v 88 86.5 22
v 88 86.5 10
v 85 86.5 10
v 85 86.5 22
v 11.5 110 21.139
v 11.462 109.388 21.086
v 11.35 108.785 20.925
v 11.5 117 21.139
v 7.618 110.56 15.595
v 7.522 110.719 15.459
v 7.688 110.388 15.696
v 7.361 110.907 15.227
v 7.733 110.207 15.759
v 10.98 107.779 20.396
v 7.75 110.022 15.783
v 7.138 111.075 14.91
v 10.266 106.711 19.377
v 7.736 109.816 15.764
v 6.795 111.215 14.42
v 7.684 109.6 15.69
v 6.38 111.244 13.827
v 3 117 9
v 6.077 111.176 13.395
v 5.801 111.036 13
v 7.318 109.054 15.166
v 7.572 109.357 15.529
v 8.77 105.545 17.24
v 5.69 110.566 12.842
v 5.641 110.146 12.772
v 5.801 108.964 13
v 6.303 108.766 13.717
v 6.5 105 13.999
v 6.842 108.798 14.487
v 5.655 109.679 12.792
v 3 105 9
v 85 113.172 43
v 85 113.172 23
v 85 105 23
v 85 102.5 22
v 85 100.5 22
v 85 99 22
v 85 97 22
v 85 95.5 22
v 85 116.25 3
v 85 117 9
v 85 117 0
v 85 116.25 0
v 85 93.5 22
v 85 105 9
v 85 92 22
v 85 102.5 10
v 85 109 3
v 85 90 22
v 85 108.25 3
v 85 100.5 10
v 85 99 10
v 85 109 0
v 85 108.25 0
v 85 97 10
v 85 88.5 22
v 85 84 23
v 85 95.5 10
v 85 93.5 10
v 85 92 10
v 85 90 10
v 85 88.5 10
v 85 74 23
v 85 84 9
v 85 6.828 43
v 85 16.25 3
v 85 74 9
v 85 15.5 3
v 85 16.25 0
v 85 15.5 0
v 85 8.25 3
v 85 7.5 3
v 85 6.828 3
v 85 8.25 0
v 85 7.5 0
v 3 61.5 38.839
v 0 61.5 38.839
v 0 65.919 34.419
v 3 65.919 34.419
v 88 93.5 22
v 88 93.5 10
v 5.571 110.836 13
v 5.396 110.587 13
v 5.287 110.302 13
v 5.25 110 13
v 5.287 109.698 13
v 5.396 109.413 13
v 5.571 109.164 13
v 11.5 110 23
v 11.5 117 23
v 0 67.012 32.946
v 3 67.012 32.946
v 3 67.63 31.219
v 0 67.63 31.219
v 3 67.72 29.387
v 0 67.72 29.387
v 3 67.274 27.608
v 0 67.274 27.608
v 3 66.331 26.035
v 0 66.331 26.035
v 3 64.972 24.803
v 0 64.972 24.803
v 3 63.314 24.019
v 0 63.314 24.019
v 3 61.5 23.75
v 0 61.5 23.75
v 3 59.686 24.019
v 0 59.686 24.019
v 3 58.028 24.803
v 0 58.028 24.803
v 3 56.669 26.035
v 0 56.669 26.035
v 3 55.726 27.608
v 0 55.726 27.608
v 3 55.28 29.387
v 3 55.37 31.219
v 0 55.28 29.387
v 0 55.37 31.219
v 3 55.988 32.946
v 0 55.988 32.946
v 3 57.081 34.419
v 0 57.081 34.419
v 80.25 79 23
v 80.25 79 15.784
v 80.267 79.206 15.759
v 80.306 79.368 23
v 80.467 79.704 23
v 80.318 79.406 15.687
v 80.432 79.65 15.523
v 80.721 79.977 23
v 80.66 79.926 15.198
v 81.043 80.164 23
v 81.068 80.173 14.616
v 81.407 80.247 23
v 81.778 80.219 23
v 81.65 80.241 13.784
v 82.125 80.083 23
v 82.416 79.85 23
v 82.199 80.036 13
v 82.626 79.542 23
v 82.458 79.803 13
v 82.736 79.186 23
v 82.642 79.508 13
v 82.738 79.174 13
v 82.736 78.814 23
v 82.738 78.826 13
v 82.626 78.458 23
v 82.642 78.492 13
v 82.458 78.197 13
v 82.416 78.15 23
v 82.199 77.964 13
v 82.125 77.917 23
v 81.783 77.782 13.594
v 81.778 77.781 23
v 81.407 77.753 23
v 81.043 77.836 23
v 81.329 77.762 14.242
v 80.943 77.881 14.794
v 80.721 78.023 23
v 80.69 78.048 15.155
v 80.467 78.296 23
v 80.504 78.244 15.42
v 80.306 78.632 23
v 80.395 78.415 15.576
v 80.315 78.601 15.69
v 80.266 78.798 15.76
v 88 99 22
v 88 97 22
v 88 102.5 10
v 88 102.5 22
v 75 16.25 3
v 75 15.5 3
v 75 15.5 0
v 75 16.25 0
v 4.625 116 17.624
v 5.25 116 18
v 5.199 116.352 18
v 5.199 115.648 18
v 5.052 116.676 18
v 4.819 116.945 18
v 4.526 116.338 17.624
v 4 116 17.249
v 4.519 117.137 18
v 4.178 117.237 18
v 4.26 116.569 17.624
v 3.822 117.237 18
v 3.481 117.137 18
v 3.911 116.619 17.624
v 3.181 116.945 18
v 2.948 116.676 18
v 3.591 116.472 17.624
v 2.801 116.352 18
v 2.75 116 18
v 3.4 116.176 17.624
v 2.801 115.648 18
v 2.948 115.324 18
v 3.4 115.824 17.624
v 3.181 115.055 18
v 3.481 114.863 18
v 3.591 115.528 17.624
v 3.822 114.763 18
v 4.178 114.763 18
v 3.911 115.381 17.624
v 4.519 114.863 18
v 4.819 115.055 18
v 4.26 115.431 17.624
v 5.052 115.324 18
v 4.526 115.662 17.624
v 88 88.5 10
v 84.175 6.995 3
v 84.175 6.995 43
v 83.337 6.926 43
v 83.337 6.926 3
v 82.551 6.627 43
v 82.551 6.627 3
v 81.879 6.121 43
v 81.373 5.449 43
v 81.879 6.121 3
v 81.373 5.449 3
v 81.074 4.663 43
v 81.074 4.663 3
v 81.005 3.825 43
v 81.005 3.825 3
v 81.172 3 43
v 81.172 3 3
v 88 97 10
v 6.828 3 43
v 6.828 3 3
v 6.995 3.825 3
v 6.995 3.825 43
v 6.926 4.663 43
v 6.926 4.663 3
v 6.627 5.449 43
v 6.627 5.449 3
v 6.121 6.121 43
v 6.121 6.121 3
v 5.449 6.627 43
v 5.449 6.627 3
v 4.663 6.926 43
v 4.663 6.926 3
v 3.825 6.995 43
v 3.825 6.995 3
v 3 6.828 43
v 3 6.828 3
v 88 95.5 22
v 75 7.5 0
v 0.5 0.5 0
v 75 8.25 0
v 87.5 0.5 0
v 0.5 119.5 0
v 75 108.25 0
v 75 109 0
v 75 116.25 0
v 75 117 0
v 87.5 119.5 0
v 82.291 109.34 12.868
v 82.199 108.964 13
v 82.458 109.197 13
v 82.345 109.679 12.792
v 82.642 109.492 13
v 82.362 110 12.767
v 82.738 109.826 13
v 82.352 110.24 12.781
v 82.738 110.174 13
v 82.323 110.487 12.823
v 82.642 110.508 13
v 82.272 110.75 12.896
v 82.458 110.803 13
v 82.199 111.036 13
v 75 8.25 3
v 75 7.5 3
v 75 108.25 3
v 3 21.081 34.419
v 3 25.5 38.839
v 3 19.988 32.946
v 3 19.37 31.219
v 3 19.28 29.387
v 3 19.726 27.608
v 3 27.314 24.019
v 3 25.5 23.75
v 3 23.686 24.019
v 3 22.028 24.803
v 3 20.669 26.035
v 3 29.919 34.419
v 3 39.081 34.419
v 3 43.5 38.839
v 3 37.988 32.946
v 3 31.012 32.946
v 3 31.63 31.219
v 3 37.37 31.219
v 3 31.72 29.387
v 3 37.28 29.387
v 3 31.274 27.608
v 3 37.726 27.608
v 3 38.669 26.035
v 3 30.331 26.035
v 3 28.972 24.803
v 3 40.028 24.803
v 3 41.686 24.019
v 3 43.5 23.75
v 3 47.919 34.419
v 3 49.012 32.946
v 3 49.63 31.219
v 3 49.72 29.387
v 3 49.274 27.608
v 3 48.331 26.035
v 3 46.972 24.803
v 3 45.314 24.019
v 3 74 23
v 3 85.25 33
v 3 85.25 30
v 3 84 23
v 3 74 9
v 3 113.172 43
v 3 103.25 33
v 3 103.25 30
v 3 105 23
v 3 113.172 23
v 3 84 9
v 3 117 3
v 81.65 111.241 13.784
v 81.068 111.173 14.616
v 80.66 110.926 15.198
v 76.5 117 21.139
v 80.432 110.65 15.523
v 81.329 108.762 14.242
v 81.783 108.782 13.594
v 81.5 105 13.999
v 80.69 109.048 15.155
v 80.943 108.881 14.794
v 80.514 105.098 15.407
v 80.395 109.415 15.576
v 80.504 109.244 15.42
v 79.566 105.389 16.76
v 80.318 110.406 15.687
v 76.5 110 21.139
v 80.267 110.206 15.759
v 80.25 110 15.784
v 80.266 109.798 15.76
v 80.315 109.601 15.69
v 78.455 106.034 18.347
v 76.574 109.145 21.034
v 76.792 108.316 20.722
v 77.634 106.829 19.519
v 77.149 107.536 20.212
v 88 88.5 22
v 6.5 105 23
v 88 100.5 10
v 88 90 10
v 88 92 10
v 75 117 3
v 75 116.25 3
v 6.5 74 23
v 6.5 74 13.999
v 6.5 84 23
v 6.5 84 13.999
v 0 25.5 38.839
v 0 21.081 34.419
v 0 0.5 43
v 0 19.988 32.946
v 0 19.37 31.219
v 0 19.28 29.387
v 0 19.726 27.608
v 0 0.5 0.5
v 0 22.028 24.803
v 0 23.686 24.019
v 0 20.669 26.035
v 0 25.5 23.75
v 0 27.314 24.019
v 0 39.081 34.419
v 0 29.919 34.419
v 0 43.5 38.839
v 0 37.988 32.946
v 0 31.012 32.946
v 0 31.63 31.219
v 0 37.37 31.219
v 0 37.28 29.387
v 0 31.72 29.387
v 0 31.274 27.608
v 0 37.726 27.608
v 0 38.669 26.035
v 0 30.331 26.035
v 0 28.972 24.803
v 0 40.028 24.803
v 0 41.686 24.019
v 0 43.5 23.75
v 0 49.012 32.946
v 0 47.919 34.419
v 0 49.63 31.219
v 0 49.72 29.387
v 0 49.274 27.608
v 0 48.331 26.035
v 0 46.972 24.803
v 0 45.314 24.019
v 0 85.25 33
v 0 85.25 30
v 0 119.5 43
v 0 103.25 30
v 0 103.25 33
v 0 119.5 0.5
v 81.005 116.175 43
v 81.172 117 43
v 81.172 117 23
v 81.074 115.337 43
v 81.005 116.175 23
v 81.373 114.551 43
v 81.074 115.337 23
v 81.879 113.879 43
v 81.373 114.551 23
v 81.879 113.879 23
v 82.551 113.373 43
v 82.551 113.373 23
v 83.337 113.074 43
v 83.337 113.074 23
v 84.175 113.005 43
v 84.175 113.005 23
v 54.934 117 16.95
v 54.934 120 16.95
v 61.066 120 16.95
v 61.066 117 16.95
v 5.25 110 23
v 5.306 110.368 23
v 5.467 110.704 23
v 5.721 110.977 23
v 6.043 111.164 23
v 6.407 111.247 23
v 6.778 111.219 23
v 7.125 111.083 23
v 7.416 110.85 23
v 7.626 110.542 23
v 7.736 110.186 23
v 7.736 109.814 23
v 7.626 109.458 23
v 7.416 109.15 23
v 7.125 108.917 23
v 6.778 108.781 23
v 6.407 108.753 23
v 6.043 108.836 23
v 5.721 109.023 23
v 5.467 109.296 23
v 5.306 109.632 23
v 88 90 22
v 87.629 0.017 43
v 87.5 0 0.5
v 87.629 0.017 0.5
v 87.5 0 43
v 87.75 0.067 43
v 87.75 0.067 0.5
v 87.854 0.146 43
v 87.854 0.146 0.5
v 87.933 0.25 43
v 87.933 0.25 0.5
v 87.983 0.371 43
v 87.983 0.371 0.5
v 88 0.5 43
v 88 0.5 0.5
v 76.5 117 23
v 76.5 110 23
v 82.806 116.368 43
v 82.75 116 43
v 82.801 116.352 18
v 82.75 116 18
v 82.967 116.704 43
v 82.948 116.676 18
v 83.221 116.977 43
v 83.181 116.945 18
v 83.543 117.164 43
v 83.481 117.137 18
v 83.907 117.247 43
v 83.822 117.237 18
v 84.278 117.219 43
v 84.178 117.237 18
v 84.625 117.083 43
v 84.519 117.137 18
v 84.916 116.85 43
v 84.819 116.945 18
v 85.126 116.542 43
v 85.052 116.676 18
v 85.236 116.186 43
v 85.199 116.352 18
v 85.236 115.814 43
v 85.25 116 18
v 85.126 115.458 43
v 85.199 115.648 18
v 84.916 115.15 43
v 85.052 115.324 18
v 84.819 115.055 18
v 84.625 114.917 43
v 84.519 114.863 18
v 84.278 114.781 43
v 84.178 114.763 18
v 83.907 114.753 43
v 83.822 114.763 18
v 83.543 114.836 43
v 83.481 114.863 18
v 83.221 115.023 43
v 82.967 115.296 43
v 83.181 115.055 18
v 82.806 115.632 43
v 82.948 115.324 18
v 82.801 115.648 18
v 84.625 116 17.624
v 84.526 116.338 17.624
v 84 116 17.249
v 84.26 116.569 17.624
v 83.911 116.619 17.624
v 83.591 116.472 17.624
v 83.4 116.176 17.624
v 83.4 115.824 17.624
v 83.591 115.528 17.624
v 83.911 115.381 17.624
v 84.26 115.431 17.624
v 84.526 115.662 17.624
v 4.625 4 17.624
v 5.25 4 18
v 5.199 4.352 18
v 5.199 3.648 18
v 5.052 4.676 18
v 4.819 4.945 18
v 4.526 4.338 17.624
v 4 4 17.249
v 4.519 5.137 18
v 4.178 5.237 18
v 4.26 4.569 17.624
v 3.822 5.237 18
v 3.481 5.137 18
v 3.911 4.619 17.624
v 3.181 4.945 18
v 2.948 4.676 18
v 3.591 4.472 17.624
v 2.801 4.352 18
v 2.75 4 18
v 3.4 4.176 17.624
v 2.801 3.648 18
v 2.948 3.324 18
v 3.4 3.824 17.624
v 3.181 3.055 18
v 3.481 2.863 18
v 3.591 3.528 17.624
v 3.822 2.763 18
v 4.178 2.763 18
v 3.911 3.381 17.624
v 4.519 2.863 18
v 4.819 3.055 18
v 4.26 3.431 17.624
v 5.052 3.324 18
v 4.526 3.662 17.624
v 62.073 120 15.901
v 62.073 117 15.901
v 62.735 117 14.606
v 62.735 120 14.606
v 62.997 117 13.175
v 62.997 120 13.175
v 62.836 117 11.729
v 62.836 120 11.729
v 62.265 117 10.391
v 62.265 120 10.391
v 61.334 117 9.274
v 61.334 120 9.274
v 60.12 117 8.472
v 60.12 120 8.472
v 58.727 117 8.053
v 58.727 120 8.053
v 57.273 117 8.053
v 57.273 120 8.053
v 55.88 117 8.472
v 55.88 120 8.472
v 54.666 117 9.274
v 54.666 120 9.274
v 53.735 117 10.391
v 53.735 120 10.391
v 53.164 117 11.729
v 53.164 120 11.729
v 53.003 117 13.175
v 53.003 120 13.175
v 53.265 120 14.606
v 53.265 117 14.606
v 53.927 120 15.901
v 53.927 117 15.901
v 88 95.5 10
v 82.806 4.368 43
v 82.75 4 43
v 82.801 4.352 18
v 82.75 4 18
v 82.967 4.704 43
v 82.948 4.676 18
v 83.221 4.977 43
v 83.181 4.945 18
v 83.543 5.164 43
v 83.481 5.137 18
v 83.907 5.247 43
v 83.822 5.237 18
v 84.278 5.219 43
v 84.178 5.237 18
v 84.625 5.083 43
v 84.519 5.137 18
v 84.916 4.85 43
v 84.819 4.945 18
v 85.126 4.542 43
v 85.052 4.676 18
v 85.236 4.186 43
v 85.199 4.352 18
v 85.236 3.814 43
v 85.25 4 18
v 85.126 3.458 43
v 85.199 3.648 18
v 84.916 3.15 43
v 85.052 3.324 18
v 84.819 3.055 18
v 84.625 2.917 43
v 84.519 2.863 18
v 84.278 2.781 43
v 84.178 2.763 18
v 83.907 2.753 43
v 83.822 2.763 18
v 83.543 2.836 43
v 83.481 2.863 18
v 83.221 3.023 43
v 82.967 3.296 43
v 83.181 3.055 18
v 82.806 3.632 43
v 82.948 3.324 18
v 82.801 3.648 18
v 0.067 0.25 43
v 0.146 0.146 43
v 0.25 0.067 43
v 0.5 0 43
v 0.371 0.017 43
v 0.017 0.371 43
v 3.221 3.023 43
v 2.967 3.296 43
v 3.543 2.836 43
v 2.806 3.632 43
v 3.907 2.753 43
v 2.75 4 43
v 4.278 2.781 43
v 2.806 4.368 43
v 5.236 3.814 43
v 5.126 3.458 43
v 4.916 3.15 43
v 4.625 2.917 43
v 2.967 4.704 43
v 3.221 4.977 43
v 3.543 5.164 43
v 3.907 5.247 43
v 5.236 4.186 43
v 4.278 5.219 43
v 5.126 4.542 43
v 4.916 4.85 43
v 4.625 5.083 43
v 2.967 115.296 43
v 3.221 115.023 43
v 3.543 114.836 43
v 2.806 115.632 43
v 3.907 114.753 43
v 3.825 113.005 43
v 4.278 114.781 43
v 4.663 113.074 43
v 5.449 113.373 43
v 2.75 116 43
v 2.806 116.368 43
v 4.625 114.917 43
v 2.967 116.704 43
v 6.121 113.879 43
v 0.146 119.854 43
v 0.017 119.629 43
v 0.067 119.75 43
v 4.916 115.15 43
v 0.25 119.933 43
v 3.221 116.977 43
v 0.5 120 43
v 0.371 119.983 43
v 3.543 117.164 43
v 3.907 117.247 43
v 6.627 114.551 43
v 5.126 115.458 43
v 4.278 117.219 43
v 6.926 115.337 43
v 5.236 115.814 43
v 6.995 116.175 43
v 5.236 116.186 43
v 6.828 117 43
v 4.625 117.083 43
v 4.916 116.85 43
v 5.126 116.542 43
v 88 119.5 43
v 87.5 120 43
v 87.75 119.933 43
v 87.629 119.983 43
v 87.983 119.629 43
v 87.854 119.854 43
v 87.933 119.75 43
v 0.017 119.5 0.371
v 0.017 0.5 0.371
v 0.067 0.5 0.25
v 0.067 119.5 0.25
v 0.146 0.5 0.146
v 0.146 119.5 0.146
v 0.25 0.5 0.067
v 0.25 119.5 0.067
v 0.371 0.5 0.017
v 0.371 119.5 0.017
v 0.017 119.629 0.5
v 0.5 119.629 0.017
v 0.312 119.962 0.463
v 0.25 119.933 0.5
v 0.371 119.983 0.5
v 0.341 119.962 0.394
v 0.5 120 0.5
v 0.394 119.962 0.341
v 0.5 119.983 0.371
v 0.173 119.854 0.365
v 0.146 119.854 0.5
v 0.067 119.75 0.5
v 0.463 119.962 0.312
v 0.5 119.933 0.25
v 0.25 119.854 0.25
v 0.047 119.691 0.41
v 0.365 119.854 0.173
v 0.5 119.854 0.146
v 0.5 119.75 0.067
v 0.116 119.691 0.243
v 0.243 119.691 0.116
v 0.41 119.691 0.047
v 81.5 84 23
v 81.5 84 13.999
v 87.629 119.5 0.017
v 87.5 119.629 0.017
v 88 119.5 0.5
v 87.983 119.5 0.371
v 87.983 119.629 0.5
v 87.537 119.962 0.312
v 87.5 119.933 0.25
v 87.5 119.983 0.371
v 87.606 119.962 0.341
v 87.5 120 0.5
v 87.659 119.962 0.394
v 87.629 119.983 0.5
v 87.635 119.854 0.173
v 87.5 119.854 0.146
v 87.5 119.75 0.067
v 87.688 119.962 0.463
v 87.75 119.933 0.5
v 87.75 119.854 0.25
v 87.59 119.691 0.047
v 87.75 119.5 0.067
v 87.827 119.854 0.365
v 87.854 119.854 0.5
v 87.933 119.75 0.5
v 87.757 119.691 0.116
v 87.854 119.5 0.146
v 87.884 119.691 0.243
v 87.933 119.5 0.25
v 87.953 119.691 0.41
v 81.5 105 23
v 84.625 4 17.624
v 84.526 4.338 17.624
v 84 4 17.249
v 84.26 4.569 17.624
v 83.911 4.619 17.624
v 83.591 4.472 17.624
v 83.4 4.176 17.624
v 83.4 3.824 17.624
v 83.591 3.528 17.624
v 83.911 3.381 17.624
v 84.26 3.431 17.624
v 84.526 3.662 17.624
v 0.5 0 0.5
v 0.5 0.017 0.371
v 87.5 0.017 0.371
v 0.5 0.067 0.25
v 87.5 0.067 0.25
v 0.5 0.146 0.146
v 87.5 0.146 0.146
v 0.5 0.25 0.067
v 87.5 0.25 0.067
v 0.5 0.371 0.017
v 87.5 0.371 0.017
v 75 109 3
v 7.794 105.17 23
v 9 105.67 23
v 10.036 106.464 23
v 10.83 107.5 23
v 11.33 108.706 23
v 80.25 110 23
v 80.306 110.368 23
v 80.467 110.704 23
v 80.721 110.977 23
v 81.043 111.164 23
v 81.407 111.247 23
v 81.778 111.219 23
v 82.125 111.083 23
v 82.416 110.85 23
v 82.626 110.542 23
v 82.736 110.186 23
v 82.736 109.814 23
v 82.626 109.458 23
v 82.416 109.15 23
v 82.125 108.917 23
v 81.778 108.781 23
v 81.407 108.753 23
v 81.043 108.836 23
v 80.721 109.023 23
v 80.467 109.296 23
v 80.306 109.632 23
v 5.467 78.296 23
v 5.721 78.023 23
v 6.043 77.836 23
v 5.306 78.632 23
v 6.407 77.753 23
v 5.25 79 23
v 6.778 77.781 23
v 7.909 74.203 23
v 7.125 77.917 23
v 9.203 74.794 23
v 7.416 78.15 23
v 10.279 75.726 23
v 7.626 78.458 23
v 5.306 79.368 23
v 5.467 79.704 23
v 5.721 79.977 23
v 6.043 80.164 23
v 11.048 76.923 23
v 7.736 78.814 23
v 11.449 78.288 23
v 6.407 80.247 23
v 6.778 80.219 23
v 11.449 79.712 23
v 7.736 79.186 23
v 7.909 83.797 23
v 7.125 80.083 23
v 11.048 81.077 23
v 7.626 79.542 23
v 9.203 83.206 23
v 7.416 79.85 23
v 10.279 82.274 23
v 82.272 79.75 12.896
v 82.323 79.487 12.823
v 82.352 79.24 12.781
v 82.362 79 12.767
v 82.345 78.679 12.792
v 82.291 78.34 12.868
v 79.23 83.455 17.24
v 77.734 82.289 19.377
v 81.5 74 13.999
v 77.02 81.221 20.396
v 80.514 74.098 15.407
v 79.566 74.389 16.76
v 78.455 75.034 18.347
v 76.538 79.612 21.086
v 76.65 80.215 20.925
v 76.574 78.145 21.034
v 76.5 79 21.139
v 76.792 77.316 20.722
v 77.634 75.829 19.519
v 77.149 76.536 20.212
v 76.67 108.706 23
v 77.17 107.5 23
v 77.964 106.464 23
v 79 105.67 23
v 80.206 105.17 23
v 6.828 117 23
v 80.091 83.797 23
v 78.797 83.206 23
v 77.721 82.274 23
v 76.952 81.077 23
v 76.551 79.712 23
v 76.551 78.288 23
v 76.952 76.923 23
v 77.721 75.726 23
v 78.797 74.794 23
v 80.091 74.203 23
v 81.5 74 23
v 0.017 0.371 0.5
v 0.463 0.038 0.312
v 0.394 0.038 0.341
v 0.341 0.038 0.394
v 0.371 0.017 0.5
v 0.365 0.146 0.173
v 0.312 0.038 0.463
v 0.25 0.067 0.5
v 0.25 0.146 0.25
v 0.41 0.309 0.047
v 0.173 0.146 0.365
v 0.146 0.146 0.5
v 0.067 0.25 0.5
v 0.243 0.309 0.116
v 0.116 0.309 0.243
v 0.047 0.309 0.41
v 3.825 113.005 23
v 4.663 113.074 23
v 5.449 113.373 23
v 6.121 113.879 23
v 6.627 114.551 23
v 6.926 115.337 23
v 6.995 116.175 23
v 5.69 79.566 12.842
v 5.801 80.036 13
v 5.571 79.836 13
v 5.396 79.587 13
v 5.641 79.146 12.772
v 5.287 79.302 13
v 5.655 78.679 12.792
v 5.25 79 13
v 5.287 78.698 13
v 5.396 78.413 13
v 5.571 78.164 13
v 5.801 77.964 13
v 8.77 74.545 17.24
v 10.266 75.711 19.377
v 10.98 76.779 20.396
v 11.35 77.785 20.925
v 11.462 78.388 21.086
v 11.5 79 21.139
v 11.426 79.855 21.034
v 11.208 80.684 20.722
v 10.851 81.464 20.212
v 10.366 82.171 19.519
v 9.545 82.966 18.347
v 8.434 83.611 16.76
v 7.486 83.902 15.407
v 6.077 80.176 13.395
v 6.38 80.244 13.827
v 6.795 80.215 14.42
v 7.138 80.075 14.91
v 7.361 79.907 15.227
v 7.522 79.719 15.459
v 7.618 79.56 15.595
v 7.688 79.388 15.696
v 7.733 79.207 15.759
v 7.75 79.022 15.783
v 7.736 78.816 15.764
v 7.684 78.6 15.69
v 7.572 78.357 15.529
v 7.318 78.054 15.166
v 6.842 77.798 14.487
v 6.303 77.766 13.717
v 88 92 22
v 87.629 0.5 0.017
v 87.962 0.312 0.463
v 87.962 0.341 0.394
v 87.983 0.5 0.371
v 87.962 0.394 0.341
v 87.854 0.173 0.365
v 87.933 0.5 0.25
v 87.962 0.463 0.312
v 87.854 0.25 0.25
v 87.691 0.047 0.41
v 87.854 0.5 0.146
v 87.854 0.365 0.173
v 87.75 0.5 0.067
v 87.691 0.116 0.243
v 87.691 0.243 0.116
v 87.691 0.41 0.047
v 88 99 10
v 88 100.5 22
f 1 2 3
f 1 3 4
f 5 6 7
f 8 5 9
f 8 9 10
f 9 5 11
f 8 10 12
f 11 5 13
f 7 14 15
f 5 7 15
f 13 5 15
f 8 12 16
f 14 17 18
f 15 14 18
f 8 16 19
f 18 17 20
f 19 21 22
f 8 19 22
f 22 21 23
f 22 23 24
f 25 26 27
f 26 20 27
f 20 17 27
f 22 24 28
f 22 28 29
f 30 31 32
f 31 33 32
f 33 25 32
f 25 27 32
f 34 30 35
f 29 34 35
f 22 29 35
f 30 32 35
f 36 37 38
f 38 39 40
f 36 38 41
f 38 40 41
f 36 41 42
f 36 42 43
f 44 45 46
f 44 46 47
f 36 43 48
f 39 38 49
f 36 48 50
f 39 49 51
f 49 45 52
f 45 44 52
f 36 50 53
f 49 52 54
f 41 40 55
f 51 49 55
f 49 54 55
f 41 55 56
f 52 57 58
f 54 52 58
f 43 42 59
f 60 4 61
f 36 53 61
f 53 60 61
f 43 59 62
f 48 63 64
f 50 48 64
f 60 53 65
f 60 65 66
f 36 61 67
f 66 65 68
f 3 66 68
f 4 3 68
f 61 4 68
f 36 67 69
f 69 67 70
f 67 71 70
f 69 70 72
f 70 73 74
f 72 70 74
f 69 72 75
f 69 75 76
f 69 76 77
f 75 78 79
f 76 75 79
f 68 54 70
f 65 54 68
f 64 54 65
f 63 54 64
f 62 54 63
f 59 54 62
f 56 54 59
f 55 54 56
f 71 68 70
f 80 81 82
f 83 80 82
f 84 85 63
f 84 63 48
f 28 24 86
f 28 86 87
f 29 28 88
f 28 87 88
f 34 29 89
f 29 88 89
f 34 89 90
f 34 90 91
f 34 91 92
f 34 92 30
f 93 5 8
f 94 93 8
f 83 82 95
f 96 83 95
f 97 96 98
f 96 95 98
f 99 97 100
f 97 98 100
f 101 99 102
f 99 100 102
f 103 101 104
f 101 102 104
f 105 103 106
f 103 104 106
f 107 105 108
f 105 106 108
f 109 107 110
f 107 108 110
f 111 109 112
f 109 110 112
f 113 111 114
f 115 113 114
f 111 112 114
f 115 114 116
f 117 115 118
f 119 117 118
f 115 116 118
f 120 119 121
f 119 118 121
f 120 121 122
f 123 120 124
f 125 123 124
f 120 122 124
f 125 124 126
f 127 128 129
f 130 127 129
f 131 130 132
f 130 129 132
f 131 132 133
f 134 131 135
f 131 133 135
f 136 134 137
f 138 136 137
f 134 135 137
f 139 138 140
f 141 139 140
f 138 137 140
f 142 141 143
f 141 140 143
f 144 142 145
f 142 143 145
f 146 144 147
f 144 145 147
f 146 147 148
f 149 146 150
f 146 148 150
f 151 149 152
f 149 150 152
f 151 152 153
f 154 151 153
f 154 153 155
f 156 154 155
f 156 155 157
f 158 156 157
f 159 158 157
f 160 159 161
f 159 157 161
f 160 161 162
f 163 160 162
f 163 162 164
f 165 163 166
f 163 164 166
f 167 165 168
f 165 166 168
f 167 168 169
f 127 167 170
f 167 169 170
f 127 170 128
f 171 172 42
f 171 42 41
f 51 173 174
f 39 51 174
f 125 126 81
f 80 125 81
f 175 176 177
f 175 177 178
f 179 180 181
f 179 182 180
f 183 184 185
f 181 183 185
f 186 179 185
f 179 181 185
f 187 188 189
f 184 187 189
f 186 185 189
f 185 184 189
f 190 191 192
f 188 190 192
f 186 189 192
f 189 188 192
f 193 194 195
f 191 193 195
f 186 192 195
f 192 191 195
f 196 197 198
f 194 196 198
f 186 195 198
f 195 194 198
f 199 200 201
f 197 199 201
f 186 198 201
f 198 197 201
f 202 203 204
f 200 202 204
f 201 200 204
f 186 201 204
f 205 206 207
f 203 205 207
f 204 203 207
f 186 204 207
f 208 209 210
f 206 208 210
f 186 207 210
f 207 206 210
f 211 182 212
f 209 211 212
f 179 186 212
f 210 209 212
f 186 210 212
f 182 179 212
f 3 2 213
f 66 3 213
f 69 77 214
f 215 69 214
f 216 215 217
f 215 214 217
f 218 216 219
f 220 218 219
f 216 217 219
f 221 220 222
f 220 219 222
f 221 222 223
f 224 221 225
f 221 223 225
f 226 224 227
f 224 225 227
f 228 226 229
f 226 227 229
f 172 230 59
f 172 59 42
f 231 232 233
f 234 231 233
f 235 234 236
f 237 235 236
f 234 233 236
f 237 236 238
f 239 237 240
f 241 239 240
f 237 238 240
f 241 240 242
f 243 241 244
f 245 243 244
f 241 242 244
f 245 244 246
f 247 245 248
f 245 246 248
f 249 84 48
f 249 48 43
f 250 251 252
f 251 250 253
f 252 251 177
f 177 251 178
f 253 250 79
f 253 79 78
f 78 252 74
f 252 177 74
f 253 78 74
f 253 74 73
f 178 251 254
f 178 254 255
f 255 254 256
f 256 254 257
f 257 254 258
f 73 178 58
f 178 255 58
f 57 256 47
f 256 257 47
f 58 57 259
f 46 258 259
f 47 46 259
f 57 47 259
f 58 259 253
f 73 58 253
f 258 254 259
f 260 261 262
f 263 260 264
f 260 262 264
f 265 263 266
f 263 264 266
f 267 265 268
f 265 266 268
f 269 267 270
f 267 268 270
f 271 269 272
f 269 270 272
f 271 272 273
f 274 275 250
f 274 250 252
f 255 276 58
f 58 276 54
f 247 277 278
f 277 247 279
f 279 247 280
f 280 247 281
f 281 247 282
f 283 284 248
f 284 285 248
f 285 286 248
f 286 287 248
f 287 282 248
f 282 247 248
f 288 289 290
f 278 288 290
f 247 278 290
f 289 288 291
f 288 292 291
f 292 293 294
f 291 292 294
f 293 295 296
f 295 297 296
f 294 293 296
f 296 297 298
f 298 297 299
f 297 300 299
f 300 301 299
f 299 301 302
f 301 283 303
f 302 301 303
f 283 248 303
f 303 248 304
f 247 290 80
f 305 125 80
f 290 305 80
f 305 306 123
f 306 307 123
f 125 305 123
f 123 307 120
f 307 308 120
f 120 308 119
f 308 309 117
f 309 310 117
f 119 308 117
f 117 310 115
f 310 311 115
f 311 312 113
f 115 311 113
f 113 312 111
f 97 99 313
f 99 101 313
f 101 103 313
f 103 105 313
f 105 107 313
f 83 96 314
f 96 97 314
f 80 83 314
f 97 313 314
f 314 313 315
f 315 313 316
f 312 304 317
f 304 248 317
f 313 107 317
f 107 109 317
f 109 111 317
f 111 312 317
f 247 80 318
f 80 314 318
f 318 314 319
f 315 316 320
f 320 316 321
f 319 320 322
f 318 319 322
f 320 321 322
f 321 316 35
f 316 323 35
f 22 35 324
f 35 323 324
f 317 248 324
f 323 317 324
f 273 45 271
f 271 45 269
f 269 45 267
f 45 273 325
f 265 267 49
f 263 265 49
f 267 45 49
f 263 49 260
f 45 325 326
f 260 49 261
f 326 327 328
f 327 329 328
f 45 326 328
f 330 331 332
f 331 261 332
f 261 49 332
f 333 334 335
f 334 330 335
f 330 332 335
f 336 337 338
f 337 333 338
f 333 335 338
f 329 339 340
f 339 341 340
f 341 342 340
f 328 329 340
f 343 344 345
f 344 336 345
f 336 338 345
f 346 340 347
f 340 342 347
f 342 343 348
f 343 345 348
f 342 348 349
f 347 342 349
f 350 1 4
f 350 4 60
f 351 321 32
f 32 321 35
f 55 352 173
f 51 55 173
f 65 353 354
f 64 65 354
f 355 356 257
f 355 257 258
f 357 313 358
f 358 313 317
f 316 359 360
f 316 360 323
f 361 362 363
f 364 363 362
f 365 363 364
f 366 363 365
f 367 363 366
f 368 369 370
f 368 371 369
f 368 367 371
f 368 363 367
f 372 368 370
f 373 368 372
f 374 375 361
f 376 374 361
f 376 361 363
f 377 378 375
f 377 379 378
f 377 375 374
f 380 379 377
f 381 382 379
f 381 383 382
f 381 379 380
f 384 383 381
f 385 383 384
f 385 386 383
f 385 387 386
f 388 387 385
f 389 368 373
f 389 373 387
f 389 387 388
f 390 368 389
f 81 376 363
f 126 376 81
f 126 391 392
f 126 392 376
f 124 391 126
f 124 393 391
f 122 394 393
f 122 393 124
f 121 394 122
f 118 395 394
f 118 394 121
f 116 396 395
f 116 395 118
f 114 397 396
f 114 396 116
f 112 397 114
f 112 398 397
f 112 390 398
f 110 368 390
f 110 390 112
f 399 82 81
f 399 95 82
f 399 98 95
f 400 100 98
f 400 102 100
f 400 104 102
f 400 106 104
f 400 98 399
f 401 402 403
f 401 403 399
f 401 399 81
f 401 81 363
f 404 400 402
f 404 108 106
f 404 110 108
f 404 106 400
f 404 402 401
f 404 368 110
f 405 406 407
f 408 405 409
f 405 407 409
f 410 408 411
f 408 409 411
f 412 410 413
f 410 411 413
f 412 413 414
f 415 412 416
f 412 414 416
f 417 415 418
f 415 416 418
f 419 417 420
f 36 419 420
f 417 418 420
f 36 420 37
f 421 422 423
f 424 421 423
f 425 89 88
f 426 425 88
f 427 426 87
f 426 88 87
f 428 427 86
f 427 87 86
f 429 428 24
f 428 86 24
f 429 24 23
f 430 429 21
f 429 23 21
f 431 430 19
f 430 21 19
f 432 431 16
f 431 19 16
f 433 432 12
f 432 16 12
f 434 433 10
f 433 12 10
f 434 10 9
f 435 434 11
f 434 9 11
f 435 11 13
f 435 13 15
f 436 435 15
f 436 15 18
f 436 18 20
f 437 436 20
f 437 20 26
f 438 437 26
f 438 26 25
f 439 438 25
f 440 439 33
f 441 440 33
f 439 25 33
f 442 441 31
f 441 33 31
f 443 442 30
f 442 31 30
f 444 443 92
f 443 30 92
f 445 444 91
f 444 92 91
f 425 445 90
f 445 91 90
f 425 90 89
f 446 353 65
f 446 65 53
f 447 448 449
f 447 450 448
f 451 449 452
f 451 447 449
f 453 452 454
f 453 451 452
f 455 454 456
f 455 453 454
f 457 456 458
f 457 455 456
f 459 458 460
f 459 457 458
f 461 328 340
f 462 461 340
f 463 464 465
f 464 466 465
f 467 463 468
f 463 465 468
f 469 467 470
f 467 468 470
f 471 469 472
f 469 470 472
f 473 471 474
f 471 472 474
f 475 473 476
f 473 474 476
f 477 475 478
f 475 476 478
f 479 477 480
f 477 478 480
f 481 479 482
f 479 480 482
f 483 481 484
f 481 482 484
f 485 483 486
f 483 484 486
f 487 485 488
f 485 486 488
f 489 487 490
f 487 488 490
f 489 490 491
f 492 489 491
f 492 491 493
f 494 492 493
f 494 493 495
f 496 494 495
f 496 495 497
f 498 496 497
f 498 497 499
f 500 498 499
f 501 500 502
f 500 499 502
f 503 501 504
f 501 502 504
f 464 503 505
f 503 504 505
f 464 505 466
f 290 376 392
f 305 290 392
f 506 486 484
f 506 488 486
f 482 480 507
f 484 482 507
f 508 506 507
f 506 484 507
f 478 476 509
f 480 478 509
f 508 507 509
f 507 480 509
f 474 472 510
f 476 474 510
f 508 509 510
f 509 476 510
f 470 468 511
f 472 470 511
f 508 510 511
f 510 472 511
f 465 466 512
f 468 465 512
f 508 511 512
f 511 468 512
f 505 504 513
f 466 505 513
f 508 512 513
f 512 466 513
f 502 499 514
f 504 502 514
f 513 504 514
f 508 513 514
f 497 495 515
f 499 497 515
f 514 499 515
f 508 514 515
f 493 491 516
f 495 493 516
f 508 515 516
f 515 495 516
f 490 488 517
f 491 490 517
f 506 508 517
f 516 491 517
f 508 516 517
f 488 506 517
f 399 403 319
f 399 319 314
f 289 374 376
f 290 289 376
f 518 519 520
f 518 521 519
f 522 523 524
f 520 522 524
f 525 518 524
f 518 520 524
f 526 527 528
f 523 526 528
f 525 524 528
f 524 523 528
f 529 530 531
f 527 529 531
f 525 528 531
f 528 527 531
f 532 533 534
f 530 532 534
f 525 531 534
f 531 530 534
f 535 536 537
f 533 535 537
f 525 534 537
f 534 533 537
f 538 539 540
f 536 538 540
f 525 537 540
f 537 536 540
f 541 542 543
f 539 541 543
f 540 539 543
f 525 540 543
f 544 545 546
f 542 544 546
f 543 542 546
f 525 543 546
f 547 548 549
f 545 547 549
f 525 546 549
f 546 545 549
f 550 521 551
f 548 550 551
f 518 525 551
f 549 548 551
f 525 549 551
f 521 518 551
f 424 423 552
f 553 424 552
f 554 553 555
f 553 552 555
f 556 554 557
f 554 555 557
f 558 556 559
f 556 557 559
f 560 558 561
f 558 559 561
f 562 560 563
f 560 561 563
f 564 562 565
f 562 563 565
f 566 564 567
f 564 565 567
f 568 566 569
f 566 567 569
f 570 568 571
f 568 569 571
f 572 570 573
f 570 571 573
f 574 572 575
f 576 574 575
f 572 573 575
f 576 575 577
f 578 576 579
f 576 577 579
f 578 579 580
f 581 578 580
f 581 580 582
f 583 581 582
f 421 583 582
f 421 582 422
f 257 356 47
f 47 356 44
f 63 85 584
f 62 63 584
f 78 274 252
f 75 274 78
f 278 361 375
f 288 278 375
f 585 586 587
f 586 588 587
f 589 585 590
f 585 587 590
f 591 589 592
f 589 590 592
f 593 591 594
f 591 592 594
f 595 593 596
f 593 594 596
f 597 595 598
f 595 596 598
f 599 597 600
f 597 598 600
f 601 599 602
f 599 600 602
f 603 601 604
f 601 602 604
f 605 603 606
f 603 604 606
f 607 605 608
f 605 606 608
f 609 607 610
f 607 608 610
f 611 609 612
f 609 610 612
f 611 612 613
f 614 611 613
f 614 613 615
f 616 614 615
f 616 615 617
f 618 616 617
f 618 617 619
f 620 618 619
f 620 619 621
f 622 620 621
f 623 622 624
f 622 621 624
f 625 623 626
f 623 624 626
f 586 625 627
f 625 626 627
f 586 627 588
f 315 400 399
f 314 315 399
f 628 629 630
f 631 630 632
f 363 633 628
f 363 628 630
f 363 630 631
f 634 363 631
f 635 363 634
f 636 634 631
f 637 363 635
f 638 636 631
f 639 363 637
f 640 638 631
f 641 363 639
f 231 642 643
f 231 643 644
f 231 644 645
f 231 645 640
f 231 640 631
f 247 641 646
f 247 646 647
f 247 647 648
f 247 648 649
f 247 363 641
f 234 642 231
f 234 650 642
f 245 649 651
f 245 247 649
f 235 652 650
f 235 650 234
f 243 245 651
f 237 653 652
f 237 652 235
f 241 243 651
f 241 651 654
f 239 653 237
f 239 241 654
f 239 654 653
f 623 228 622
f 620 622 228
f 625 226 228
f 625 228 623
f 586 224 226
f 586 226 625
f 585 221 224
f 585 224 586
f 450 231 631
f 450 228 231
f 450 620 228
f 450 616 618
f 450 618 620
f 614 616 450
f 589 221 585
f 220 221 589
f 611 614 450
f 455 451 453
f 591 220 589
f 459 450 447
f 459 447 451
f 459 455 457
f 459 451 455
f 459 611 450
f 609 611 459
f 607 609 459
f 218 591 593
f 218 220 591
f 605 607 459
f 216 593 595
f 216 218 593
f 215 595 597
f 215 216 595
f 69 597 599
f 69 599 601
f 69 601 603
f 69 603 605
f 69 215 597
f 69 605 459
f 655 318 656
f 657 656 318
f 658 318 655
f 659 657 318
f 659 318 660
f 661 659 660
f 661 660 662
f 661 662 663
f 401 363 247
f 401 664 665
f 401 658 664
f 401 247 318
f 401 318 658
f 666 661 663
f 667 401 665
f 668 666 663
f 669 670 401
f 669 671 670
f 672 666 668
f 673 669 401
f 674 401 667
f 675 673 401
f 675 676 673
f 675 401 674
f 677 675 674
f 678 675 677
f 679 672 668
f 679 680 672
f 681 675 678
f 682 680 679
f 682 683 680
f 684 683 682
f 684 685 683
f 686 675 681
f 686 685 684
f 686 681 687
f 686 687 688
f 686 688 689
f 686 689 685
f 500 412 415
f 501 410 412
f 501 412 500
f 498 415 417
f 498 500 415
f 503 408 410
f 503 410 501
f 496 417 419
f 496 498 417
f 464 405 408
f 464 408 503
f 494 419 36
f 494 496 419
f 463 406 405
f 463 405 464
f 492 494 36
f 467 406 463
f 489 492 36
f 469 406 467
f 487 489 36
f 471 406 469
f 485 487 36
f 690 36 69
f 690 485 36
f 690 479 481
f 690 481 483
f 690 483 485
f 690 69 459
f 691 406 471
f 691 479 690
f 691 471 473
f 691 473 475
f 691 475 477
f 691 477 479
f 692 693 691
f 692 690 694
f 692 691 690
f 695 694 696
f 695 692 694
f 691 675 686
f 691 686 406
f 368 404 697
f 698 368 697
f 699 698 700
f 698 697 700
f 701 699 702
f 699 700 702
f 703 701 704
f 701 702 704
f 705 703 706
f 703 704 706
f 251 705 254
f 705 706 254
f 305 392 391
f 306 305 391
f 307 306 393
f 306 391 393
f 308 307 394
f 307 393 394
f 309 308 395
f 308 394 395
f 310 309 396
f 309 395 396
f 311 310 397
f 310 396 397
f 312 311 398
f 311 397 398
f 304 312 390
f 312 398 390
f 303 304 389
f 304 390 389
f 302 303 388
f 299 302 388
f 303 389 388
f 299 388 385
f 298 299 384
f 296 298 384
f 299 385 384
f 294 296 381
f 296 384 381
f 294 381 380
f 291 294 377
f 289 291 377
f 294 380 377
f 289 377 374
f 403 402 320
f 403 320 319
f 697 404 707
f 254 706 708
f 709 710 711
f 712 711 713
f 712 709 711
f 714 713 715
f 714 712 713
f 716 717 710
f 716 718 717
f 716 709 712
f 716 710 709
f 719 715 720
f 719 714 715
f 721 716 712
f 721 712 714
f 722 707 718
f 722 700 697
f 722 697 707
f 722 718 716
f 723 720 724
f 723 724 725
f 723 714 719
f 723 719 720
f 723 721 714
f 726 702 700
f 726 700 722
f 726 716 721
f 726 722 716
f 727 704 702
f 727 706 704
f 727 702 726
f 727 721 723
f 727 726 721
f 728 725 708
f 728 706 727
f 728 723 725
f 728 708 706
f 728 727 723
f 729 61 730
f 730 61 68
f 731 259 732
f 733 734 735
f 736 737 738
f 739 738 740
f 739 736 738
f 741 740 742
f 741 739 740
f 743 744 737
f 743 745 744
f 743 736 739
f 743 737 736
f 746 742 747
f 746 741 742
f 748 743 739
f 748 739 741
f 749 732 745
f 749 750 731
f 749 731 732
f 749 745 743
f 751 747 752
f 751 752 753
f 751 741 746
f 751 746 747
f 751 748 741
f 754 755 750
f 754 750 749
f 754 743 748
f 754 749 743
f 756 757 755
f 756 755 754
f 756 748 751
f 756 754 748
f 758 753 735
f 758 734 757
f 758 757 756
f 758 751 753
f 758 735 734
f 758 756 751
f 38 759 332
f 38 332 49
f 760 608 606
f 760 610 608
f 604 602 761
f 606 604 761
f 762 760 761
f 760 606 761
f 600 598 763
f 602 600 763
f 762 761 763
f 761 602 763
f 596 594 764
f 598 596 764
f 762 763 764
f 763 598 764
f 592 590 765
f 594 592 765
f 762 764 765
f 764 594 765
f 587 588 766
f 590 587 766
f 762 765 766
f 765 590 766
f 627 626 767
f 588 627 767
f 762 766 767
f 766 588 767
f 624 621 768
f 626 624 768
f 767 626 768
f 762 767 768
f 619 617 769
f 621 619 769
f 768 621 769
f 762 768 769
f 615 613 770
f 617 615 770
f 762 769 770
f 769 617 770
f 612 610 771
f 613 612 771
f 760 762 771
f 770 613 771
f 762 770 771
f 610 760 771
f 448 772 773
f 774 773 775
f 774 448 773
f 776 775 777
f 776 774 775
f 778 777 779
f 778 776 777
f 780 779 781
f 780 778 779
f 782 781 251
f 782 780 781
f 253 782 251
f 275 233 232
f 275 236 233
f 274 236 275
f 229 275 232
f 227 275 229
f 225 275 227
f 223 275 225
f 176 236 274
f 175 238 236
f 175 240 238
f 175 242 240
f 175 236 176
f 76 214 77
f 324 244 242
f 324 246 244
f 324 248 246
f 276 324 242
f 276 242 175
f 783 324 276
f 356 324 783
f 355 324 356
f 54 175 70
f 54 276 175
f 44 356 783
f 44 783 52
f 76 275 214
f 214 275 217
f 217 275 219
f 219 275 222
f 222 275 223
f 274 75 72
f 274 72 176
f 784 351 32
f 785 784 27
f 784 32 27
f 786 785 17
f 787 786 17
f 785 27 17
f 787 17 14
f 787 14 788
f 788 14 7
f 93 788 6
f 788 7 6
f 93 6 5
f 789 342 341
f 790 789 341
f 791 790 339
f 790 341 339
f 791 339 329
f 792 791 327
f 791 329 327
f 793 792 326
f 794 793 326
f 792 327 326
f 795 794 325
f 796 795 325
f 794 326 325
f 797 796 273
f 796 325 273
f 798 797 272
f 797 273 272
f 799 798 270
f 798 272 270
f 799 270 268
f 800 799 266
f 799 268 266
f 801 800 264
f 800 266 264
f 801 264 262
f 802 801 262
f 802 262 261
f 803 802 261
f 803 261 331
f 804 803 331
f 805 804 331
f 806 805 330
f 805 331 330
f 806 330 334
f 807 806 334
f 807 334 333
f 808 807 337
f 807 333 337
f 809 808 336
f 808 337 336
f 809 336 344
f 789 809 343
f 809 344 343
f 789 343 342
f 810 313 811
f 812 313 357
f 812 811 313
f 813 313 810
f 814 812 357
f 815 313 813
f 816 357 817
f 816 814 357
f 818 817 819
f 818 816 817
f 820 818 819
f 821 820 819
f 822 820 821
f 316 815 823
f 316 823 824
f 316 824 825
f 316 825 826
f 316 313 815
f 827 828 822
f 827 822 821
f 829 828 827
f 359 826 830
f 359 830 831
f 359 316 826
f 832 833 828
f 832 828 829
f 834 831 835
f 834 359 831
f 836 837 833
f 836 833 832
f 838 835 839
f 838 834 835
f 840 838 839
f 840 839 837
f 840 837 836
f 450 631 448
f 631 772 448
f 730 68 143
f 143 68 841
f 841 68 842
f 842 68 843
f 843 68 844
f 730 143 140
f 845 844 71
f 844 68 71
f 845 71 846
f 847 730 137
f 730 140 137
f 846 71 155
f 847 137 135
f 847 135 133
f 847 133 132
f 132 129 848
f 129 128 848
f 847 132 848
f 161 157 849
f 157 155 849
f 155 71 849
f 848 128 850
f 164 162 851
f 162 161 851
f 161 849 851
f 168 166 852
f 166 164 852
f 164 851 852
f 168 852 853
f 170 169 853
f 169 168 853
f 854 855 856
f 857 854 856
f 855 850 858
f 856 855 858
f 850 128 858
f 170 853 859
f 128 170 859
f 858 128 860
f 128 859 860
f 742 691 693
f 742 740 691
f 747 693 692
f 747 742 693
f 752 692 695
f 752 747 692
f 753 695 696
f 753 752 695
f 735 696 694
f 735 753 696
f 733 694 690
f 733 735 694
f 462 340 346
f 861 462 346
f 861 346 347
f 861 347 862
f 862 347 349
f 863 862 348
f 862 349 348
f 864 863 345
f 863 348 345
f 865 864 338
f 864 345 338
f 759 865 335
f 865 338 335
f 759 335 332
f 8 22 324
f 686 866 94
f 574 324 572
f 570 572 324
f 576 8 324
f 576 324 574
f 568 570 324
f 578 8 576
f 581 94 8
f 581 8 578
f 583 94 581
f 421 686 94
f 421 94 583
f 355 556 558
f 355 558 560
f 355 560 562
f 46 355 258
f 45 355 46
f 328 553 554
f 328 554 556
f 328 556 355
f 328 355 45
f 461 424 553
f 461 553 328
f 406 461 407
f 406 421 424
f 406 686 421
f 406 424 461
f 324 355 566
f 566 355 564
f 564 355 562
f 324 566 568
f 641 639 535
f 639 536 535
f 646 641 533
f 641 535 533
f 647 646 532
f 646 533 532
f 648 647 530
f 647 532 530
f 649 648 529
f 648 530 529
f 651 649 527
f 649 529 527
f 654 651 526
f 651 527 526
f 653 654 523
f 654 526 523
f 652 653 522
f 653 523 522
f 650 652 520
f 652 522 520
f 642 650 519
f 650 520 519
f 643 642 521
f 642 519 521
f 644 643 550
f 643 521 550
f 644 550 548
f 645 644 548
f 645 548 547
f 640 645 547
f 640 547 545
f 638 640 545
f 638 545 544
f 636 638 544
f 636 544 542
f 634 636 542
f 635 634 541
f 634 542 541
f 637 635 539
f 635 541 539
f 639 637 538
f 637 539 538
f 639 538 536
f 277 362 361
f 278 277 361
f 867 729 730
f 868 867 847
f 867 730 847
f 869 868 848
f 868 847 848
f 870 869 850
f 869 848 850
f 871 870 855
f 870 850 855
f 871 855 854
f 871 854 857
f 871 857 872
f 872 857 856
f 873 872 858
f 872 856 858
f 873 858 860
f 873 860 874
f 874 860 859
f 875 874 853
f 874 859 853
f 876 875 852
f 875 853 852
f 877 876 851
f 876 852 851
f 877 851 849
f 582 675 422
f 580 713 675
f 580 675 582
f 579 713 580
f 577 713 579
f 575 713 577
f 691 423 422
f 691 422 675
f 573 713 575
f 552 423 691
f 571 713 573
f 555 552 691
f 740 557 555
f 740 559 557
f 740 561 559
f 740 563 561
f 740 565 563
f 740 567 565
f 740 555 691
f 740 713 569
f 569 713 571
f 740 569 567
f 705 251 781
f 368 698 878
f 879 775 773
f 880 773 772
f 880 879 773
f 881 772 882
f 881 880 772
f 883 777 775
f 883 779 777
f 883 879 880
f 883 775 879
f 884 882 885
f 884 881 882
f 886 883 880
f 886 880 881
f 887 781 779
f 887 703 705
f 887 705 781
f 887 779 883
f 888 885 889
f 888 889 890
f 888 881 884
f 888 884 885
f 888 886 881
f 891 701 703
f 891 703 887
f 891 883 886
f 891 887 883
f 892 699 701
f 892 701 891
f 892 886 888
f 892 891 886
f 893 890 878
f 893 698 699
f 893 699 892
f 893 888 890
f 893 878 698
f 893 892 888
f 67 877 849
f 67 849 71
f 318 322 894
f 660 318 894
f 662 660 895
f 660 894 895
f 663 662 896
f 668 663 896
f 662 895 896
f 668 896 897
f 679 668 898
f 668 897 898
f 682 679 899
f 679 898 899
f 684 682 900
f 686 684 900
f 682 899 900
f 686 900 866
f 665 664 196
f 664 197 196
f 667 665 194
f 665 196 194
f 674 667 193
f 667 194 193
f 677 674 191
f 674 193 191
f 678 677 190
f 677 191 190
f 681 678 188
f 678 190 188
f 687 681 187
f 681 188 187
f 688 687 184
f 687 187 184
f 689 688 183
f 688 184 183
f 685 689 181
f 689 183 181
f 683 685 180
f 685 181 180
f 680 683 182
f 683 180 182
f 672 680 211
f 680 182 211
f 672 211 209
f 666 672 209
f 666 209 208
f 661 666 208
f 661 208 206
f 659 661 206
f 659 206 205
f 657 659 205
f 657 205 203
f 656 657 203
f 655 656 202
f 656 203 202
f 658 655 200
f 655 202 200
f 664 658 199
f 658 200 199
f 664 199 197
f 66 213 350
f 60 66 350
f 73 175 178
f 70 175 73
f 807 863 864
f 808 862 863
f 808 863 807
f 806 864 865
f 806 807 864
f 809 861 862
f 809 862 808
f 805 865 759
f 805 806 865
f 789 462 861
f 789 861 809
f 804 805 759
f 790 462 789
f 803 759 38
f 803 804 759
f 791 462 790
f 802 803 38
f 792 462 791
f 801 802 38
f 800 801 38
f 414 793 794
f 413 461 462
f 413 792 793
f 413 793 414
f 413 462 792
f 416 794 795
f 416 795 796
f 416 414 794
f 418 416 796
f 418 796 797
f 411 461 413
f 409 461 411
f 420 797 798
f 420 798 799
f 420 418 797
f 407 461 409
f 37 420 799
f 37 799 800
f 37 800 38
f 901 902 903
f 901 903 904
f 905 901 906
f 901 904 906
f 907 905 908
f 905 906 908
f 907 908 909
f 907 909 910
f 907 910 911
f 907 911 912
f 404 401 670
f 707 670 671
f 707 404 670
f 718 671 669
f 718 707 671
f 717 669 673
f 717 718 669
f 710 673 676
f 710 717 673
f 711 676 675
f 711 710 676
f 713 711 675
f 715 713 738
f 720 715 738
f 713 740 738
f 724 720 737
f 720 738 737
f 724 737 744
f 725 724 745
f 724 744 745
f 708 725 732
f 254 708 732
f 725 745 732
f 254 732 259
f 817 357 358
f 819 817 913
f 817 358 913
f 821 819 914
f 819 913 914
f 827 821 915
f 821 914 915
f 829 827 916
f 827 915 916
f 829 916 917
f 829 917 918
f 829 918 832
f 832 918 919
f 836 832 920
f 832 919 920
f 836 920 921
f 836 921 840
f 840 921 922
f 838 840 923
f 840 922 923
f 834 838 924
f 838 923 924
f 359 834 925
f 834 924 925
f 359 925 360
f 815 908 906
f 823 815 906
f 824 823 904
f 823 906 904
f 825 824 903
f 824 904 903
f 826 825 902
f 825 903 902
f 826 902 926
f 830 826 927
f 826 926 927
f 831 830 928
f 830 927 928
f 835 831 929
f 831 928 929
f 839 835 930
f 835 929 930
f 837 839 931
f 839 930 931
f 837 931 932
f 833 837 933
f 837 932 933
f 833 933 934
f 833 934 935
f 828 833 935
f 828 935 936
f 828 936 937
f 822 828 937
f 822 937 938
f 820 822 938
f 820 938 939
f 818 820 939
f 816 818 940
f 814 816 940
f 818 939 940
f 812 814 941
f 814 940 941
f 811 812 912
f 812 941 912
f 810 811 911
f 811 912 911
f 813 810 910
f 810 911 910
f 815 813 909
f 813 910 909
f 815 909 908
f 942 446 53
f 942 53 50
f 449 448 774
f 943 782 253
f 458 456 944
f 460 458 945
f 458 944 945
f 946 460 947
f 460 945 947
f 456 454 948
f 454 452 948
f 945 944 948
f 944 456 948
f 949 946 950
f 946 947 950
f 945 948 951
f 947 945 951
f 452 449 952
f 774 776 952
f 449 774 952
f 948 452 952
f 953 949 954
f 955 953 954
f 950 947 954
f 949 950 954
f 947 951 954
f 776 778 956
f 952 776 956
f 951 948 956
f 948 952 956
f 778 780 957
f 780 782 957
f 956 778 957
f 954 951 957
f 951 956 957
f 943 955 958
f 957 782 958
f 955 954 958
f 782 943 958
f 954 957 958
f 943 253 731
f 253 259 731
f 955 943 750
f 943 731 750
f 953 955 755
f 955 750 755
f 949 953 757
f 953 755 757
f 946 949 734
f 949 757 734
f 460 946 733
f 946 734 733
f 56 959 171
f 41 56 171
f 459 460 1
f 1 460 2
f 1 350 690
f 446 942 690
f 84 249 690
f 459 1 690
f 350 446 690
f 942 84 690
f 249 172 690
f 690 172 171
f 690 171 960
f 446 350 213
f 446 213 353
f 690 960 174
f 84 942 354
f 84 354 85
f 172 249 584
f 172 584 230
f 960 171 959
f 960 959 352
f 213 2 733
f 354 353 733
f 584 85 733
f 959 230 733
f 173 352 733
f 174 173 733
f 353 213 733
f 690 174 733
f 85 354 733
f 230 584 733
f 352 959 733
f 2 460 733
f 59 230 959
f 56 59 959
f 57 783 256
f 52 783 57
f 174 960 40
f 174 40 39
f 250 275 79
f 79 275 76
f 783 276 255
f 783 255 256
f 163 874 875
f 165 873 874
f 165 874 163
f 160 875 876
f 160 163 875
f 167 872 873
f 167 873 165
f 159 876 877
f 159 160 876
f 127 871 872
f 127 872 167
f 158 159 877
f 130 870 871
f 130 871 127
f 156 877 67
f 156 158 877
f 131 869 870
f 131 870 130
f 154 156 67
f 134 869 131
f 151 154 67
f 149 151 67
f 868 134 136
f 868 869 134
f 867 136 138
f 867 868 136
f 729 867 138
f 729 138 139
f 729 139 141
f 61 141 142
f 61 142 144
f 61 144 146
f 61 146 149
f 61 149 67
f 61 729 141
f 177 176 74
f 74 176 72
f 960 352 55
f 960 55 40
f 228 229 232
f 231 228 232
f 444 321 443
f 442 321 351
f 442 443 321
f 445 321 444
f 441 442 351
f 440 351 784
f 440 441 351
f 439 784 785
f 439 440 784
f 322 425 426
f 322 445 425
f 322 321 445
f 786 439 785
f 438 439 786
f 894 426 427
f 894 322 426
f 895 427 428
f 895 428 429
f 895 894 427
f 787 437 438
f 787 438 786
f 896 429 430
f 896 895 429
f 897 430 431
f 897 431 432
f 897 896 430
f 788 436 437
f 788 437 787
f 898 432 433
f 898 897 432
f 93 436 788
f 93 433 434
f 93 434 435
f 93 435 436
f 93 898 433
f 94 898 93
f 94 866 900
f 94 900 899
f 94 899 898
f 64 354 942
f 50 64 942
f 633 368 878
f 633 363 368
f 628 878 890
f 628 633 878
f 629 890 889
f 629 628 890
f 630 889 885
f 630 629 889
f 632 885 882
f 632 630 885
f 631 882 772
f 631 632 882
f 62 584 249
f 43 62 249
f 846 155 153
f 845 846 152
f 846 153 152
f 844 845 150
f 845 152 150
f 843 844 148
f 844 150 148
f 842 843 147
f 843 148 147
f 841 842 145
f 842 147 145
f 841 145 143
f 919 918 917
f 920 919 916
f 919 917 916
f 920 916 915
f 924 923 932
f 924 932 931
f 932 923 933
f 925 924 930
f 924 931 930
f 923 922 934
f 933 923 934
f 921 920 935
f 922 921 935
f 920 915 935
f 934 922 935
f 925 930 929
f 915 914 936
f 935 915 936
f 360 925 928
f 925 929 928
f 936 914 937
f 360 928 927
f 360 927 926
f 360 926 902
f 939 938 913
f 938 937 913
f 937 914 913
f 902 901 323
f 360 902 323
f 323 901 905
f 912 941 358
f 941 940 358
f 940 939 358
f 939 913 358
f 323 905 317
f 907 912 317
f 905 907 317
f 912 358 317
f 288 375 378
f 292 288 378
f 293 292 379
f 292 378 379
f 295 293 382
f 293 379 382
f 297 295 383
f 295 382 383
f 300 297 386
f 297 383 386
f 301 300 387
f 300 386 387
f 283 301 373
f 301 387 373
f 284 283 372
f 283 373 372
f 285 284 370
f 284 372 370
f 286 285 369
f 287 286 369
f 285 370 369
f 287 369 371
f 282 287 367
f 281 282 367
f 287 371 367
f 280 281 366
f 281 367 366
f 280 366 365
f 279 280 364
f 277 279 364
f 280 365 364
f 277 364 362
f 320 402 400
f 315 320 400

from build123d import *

# Parameters (mm, degrees)
F0_W      = 88
F0_H      = 120
F1_DEPTH  = 3
F2_W      = 88
F2_H      = 120
F3_DEPTH  = 40
F5_DEPTH  = 3
F7_DEPTH  = 3
F8_R      = 0.5
F10_DEPTH = 20
F13_D     = 2.5
F13_DEPTH = 10
F13_TIP   = 0.7510757738
F15_DEPTH = 43
F17_DEPTH = 43
F18_W     = 10
F18_H     = 0.75
F19_DEPTH = 3
F21_D     = 2.5
F21_DEPTH = 25
F21_TIP   = 0.7510757738
F22_W     = 18
F22_H     = 3
F23_DEPTH = 3
F24_W     = 2
F24_H     = 12
F25_DEPTH = 3


with BuildPart() as f1:
    # F0 (on Top) → F1 (new body)
    with BuildSketch(Plane.XY):
        with Locations((44, 60)):
            Rectangle(F0_W, F0_H)
    extrude(amount=F1_DEPTH)

    # F2 (on face) → F3 (join)
    with BuildSketch(Plane.XY.offset(3)):
        with Locations((44, 60)):
            Rectangle(F2_W, F2_H)
        with BuildLine():
            ThreePointArc((3, 113.1715728753), (6.1213203436, 113.8786796564), (6.8284271247, 117))
            Line((6.8284271247, 117), (81.1715728753, 117))
            ThreePointArc((81.1715728753, 117), (81.8786796564, 113.8786796564), (85, 113.1715728753))
            Line((85, 113.1715728753), (85, 6.8284271247))
            ThreePointArc((85, 6.8284271247), (81.8786796564, 6.1213203436), (81.1715728753, 3))
            Line((81.1715728753, 3), (6.8284271247, 3))
            ThreePointArc((6.8284271247, 3), (6.1213203436, 6.1213203436), (3, 6.8284271247))
            Line((3, 6.8284271247), (3, 113.1715728753))
        make_face(mode=Mode.SUBTRACT)
    extrude(amount=F3_DEPTH)

    # F4 (on face) → F5 (cut, through all)
    with BuildSketch(Plane(origin=(0, 0, 0), x_dir=(0, -1, 0), z_dir=(-1, 0, 0))):
        with BuildLine():
            Line((-61.5, 38.8388347648), (-65.9194173824, 34.4194173824))
            ThreePointArc((-65.9194173824, 34.4194173824), (-61.5, 23.75), (-57.0805826176, 34.4194173824))
            Line((-57.0805826176, 34.4194173824), (-61.5, 38.8388347648))
        make_face()
        with BuildLine():
            Line((-39.0805826176, 34.4194173824), (-43.5, 38.8388347648))
            Line((-43.5, 38.8388347648), (-47.9194173824, 34.4194173824))
            ThreePointArc((-47.9194173824, 34.4194173824), (-43.5, 23.75), (-39.0805826176, 34.4194173824))
        make_face()
        with BuildLine():
            Line((-21.0805826176, 34.4194173824), (-25.5, 38.8388347648))
            Line((-25.5, 38.8388347648), (-29.9194173824, 34.4194173824))
            ThreePointArc((-29.9194173824, 34.4194173824), (-25.5, 23.75), (-21.0805826176, 34.4194173824))
        make_face()
    extrude(amount=-F5_DEPTH, mode=Mode.SUBTRACT)

    # F6 (on face) → F7 (cut, through all)
    with BuildSketch(Plane(origin=(0, 120, 0), x_dir=(-1, 0, 0), z_dir=(0, 1, 0))):
        with BuildLine():
            Line((-54.9344657888, 16.95), (-61.0655342112, 16.95))
            ThreePointArc((-61.0655342112, 16.95), (-58, 8), (-54.9344657888, 16.95))
        make_face()
    extrude(amount=-F7_DEPTH, mode=Mode.SUBTRACT)

    # F8
    f8_edges = [f1.edges().sort_by_distance(p)[0] for p in [
        (0, 60, 0),
        (44, 0, 0),
        (0, 0, 21.5),
        (0, 120, 21.5),
        (88, 0, 21.5),
        (88, 60, 0),
        (44, 120, 0),
        (88, 120, 21.5),
    ]]
    fillet(f8_edges, radius=F8_R)

    # F9 (on face) → F10 (join)
    with BuildSketch(Plane.XY.offset(3)):
        with BuildLine():
            Line((6.5, 84), (3, 84))
            Line((3, 84), (3, 74))
            Line((3, 74), (6.5, 74))
            ThreePointArc((6.5, 74), (11.5, 79), (6.5, 84))
        make_face()
        with BuildLine():
            Line((3, 105), (6.5, 105))
            ThreePointArc((6.5, 105), (10.0355339059, 106.4644660941), (11.5, 110))
            Line((11.5, 110), (11.5, 117))
            Line((11.5, 117), (6.8284271247, 117))
            ThreePointArc((6.8284271247, 117), (6.1213203436, 113.8786796564), (3, 113.1715728753))
            Line((3, 113.1715728753), (3, 105))
        make_face()
        with BuildLine():
            Line((81.1715728753, 117), (76.5, 117))
            Line((76.5, 117), (76.5, 110))
            ThreePointArc((76.5, 110), (77.9644660941, 106.4644660941), (81.5, 105))
            Line((81.5, 105), (85, 105))
            Line((85, 105), (85, 113.1715728753))
            ThreePointArc((85, 113.1715728753), (81.8786796564, 113.8786796564), (81.1715728753, 117))
        make_face()
        with BuildLine():
            Line((85, 74), (85, 84))
            Line((85, 84), (81.5, 84))
            ThreePointArc((81.5, 84), (76.5, 79), (81.5, 74))
            Line((81.5, 74), (85, 74))
        make_face()
    extrude(amount=F10_DEPTH)

    # F13
    with Locations(Plane.XY.offset(23)):
        with Locations((6.5, 110), (6.5, 79), (81.5, 79), (81.5, 110)):
            Hole(F13_D / 2, depth=F13_DEPTH)
            with Locations((0, 0, -(F13_DEPTH + F13_TIP / 2))):  # 118° drill point
                Cone(0, F13_D / 2, F13_TIP, mode=Mode.SUBTRACT)

    # F14 (on face) → F15 (cut, through all)
    with BuildSketch(Plane.XZ.offset(-74)):
        Polygon((76.5, 3), (85, 3), (85, 9), (76.5, 21.1392580573), align=None)
    extrude(amount=-F15_DEPTH, mode=Mode.SUBTRACT)

    # F16 (on face) → F17 (cut, through all)
    with BuildSketch(Plane.XZ.offset(-74)):
        Polygon((3, 9), (3, 3), (11.5, 3), (11.5, 21.1392580573), align=None)
    extrude(amount=-F17_DEPTH, mode=Mode.SUBTRACT)

    # F18 (on face) → F19 (cut, through all)
    with BuildSketch(Plane.XY.offset(3)):
        with Locations((80, 7.875)):
            Rectangle(F18_W, F18_H)
        with Locations((80, 15.875)):
            Rectangle(F18_W, F18_H)
        with Locations((80, 108.625)):
            Rectangle(F18_W, F18_H)
        with Locations((80, 116.625)):
            Rectangle(F18_W, F18_H)
    extrude(amount=-F19_DEPTH, mode=Mode.SUBTRACT)

    # F21
    with Locations(Plane.XY.offset(43)):
        with Locations((4, 116), (4, 4), (84, 4), (84, 116)):
            Hole(F21_D / 2, depth=F21_DEPTH)
            with Locations((0, 0, -(F21_DEPTH + F21_TIP / 2))):  # 118° drill point
                Cone(0, F21_D / 2, F21_TIP, mode=Mode.SUBTRACT)

    # F22 (on face) → F23 (cut, through all)
    with BuildSketch(Plane(origin=(0, 0, 0), x_dir=(0, -1, 0), z_dir=(-1, 0, 0))):
        with Locations((-94.25, 31.5)):
            Rectangle(F22_W, F22_H)
    extrude(amount=-F23_DEPTH, mode=Mode.SUBTRACT)

    # F24 (on face) → F25 (cut, through all)
    with BuildSketch(Plane.YZ.offset(88)):
        with Locations((87.5, 16)):
            Rectangle(F24_W, F24_H)
        with Locations((91, 16)):
            Rectangle(F24_W, F24_H)
        with Locations((94.5, 16)):
            Rectangle(F24_W, F24_H)
        with Locations((98, 16)):
            Rectangle(F24_W, F24_H)
        with Locations((101.5, 16)):
            Rectangle(F24_W, F24_H)
    extrude(amount=-F25_DEPTH, mode=Mode.SUBTRACT)


solid = f1.part
